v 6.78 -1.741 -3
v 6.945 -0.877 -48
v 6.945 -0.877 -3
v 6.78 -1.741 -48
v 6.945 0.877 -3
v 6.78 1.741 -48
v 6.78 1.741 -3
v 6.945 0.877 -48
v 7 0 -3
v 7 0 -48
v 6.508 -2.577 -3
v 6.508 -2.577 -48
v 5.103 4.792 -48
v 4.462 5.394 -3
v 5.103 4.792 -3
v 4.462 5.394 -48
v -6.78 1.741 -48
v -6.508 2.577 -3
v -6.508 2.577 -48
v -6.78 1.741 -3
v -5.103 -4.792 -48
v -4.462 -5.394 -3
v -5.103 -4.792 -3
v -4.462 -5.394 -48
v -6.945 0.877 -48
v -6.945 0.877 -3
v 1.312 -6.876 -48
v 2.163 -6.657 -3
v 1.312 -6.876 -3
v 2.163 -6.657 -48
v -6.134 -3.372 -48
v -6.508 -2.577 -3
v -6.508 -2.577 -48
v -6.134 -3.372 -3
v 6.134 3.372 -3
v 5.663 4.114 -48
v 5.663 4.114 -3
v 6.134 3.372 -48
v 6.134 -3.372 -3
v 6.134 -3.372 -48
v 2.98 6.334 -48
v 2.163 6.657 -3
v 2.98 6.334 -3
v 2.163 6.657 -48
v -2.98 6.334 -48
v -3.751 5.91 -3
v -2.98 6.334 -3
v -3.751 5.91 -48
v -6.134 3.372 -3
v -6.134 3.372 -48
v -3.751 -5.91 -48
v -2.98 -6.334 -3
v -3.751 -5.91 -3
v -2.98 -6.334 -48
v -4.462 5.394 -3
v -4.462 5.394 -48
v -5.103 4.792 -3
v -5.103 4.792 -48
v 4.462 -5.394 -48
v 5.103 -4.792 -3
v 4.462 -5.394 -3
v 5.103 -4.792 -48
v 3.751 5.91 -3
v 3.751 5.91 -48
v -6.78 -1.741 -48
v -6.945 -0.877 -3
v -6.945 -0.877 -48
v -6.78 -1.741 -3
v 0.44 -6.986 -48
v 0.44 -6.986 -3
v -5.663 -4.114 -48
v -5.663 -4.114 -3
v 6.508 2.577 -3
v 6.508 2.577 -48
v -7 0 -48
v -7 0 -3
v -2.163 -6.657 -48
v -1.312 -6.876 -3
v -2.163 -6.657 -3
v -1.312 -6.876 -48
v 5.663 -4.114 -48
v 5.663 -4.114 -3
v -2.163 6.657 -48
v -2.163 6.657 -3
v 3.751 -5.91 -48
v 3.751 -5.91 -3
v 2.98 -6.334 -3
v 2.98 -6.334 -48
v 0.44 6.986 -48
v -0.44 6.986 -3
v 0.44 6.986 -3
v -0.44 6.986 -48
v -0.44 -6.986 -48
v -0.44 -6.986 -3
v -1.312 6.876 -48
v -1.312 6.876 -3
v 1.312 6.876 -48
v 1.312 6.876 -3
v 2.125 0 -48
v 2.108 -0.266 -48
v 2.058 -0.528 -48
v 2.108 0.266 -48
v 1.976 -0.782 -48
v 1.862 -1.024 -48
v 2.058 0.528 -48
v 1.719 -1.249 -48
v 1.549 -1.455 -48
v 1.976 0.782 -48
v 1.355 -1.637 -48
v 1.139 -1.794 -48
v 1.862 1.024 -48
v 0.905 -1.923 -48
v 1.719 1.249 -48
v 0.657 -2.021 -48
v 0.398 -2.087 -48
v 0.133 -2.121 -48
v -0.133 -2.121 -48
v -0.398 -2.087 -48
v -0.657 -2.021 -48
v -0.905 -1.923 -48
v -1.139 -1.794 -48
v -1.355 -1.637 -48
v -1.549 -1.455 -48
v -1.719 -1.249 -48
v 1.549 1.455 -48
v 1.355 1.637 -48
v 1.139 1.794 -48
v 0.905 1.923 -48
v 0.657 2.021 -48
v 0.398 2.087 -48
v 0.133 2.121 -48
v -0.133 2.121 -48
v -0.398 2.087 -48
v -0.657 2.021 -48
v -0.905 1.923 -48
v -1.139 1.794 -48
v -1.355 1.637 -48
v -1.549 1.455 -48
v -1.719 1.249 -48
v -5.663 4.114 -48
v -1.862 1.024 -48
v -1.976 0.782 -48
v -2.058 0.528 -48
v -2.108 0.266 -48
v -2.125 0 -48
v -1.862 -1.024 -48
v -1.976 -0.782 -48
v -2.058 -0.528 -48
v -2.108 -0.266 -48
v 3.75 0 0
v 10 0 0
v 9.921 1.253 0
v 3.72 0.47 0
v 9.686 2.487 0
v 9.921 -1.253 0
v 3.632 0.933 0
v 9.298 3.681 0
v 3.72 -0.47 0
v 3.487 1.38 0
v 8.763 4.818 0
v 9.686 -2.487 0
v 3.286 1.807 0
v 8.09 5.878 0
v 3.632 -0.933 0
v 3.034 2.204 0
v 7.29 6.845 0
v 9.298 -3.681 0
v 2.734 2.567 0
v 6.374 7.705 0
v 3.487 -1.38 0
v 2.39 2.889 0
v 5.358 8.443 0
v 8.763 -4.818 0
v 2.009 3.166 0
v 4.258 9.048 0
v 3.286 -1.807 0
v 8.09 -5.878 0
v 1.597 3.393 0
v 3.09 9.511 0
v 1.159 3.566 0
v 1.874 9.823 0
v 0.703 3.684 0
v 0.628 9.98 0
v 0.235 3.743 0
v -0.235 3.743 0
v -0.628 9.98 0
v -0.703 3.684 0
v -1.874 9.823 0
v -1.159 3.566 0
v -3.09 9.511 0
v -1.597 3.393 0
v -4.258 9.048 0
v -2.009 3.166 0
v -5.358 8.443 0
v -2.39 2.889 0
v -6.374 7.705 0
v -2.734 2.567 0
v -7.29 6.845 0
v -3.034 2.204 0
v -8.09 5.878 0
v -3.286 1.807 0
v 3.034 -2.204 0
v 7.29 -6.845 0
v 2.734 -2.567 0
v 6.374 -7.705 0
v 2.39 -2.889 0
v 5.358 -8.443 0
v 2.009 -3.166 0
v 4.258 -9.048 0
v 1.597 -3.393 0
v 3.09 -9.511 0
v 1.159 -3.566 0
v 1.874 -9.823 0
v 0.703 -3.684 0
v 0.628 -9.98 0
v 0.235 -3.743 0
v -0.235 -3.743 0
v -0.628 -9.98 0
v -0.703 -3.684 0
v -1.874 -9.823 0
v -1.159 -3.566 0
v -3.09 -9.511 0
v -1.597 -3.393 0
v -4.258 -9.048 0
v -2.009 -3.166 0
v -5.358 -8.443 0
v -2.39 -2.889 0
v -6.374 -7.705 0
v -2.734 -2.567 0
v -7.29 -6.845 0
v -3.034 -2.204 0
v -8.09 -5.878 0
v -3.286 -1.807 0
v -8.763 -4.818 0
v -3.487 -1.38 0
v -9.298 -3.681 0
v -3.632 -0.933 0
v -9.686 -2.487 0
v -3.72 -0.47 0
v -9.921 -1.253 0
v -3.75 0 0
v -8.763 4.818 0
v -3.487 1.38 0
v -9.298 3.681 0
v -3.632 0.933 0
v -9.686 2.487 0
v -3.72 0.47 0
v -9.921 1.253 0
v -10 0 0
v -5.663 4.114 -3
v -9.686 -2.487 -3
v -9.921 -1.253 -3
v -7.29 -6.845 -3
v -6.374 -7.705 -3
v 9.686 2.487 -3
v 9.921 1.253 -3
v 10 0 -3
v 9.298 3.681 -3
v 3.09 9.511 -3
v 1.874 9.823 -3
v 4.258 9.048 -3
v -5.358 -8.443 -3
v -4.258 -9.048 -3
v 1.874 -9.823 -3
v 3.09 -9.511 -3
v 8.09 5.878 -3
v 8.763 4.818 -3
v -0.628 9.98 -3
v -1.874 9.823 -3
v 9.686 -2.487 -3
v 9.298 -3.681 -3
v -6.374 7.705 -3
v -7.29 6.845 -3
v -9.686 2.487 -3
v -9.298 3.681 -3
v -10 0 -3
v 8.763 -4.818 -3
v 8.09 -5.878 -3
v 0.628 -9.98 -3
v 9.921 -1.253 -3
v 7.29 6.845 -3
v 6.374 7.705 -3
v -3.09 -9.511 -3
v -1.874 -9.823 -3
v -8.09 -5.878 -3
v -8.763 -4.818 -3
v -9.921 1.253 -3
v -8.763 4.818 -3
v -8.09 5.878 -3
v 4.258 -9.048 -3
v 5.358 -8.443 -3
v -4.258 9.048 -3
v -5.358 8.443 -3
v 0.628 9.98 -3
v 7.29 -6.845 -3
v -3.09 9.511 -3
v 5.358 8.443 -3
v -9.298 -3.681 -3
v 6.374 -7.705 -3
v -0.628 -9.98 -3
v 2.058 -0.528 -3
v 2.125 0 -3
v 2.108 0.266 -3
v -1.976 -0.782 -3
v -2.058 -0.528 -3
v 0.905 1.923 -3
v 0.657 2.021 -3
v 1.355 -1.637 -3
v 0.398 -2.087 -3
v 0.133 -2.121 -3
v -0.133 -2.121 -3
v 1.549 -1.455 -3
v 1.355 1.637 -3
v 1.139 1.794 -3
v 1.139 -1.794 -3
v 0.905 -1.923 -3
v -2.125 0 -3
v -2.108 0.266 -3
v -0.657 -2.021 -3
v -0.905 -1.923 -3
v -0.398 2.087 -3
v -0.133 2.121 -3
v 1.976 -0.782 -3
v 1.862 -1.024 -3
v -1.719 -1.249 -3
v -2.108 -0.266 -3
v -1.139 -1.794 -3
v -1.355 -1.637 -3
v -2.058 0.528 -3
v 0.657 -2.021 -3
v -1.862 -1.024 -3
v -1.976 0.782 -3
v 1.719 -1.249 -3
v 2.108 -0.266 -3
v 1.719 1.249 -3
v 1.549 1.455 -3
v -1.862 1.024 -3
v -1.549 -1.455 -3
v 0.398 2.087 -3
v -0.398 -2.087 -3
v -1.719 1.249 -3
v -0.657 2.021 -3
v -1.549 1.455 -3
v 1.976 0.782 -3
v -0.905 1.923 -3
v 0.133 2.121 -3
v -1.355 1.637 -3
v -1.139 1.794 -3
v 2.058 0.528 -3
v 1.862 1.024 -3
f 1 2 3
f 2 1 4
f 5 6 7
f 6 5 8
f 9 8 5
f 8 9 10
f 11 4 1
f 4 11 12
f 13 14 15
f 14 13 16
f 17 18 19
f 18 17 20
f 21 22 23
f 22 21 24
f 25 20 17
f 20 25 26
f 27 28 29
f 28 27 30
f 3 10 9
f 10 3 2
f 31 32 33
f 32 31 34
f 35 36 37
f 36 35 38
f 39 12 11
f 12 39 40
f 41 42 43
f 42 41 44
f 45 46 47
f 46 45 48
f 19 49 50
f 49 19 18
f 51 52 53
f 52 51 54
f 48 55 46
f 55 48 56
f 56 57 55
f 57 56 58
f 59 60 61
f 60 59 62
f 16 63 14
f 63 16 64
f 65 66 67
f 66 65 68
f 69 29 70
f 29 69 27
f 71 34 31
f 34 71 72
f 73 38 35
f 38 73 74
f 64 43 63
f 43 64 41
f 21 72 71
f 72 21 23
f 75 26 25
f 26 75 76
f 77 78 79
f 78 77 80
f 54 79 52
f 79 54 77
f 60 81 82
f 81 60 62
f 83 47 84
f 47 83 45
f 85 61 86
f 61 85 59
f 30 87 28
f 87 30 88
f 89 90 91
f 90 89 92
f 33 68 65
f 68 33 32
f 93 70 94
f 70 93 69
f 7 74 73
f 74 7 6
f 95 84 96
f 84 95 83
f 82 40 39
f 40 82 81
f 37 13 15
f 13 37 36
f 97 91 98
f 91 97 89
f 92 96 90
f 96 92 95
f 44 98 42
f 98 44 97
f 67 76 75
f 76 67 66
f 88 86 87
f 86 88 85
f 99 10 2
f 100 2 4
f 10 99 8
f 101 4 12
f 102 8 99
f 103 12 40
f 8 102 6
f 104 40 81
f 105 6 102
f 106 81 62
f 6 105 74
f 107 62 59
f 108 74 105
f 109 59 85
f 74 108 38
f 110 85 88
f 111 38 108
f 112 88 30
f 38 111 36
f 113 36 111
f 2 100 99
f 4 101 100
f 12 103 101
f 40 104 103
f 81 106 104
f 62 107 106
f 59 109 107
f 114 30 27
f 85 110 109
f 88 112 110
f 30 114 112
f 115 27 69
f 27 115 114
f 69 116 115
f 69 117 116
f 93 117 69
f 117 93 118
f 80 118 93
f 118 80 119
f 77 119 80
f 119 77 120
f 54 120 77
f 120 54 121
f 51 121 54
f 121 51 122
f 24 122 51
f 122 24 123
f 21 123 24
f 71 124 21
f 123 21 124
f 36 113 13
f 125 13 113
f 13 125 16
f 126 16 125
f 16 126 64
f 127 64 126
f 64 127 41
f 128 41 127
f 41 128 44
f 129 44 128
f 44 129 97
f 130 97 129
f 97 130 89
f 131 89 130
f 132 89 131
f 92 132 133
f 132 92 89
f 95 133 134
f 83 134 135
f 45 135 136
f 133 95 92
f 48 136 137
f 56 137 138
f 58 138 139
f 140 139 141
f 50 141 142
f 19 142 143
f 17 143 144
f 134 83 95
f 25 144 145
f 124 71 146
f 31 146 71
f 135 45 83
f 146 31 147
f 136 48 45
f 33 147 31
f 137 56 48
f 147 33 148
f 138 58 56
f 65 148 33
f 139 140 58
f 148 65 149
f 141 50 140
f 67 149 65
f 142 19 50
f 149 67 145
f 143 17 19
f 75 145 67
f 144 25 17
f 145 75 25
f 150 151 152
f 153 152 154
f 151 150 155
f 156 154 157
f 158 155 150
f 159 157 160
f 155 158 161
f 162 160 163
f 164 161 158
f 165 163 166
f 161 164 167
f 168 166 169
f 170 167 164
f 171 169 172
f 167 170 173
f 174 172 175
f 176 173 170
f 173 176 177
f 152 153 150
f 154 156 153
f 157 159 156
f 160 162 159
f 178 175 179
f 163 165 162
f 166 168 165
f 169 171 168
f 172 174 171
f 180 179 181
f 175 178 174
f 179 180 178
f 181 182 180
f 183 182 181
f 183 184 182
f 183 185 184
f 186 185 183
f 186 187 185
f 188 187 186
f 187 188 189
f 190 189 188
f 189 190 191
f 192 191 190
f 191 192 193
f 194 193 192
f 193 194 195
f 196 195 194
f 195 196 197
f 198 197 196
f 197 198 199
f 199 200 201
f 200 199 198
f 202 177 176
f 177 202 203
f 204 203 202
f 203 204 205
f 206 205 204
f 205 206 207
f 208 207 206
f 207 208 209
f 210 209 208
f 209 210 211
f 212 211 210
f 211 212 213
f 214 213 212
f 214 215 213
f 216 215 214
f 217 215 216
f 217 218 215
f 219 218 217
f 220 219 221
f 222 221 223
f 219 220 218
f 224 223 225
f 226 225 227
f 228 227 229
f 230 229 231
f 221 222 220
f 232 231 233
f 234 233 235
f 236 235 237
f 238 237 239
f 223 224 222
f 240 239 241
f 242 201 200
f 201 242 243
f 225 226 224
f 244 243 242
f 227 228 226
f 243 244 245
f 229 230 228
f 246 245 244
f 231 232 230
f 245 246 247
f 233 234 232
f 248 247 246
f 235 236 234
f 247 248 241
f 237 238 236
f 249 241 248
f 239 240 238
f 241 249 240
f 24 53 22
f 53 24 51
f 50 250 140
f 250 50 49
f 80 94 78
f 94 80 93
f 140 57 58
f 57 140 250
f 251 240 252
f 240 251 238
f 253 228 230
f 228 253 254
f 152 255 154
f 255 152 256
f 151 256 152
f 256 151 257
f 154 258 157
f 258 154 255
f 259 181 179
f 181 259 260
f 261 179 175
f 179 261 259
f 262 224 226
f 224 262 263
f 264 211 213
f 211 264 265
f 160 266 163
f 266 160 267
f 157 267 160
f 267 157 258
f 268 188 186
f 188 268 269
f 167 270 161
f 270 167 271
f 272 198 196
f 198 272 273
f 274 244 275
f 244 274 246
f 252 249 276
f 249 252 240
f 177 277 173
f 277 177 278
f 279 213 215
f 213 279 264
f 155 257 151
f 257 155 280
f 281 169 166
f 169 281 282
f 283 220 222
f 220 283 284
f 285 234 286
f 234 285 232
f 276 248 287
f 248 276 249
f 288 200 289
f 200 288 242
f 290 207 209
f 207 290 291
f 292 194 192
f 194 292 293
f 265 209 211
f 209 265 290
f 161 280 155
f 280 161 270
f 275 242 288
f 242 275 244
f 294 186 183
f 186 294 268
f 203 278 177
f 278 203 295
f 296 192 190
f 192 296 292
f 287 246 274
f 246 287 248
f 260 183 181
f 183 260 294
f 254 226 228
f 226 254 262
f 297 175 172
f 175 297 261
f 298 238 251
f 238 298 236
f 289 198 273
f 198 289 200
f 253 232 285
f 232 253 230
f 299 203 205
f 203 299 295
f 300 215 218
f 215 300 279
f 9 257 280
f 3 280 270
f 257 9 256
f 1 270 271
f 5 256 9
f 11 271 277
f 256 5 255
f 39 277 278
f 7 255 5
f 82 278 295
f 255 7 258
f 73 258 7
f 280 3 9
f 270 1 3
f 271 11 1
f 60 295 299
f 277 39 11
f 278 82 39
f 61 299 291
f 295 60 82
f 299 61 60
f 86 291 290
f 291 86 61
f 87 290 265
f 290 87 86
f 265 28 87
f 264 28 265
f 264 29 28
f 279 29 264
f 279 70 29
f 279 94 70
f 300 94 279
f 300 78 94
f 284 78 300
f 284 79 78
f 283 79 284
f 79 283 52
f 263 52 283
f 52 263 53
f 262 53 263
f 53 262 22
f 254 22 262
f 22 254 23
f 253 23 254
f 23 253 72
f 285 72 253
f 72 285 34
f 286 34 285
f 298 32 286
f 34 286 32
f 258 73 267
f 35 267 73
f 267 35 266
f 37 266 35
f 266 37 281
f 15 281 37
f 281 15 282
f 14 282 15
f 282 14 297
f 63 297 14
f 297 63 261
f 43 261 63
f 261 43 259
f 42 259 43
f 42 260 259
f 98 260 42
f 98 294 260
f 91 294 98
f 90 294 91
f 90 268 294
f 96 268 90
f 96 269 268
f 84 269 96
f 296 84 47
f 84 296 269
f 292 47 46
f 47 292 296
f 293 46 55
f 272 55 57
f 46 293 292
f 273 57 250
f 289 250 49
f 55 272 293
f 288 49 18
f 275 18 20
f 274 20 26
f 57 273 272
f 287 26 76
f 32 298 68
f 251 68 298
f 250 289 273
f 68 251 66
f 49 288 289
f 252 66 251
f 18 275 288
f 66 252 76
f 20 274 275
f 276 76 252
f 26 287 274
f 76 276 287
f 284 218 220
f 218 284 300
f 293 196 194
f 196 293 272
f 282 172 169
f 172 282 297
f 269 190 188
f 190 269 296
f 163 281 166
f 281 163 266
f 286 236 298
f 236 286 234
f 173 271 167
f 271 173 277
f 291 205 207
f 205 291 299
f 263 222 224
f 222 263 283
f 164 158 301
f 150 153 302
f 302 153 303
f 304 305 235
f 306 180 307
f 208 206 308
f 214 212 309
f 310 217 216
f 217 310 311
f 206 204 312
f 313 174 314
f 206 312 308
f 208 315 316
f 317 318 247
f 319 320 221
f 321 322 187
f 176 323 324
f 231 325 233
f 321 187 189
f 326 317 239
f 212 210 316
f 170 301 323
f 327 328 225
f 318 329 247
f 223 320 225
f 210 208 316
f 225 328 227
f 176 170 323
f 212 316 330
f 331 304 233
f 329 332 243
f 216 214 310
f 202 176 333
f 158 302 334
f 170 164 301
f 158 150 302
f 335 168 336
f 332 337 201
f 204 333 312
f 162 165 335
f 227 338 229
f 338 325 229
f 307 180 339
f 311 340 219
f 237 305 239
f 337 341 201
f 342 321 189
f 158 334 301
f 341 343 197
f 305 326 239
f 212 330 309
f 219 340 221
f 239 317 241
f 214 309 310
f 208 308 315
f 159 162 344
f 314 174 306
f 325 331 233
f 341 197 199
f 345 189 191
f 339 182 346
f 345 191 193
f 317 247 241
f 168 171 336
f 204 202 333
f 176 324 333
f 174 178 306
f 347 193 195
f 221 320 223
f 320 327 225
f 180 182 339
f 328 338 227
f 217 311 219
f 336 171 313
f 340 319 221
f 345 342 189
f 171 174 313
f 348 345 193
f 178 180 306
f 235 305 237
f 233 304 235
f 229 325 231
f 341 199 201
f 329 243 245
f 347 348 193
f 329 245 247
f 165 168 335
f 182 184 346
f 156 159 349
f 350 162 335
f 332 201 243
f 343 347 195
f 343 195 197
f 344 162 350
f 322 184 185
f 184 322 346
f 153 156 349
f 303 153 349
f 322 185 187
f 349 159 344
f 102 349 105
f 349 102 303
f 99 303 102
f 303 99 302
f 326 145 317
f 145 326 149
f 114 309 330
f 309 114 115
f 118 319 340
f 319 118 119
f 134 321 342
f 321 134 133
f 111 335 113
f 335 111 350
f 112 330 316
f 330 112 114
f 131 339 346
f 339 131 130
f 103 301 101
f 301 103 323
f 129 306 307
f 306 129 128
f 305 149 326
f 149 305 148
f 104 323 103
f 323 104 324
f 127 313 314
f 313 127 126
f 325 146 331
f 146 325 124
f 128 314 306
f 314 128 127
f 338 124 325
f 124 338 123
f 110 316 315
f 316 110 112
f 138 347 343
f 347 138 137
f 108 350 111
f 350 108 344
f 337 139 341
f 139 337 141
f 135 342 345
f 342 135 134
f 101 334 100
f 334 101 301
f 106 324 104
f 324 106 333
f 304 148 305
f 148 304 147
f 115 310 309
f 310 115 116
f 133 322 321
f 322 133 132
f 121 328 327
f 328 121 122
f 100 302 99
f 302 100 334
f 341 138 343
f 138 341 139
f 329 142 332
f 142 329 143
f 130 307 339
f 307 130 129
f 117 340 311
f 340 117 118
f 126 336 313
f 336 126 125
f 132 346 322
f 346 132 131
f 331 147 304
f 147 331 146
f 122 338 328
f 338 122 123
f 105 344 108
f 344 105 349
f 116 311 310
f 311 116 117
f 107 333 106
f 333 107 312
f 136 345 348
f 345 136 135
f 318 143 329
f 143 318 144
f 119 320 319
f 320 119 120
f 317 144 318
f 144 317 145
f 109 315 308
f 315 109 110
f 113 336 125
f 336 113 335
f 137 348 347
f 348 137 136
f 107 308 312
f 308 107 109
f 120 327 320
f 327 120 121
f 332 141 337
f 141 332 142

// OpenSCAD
$fn = 50;


difference() {
	union() {
		translate(v = [0, 0, -48.0000000000]) {
			cylinder(h = 48, r = 7.0000000000);
		}
		translate(v = [0, 0, -3.0000000000]) {
			cylinder(h = 3, r = 10.0000000000);
		}
	}
	union() {
		translate(v = [0, 0, 0]) {
			rotate(a = [0, 0, 0]) {
				difference() {
					union() {
						#translate(v = [0, 0, -48.0000000000]) {
							cylinder(h = 48, r = 2.0000000000);
						}
						#translate(v = [0, 0, -3]) {
							cylinder(h = 3, r1 = 2.1250000000, r2 = 3.7500000000);
						}
						#translate(v = [0, 0, -48.0000000000]) {
							cylinder(h = 48, r = 2.1250000000);
						}
						#translate(v = [0, 0, -48.0000000000]) {
							cylinder(h = 48, r = 2.0000000000);
						}
					}
					union();
				}
			}
		}
	}
}
